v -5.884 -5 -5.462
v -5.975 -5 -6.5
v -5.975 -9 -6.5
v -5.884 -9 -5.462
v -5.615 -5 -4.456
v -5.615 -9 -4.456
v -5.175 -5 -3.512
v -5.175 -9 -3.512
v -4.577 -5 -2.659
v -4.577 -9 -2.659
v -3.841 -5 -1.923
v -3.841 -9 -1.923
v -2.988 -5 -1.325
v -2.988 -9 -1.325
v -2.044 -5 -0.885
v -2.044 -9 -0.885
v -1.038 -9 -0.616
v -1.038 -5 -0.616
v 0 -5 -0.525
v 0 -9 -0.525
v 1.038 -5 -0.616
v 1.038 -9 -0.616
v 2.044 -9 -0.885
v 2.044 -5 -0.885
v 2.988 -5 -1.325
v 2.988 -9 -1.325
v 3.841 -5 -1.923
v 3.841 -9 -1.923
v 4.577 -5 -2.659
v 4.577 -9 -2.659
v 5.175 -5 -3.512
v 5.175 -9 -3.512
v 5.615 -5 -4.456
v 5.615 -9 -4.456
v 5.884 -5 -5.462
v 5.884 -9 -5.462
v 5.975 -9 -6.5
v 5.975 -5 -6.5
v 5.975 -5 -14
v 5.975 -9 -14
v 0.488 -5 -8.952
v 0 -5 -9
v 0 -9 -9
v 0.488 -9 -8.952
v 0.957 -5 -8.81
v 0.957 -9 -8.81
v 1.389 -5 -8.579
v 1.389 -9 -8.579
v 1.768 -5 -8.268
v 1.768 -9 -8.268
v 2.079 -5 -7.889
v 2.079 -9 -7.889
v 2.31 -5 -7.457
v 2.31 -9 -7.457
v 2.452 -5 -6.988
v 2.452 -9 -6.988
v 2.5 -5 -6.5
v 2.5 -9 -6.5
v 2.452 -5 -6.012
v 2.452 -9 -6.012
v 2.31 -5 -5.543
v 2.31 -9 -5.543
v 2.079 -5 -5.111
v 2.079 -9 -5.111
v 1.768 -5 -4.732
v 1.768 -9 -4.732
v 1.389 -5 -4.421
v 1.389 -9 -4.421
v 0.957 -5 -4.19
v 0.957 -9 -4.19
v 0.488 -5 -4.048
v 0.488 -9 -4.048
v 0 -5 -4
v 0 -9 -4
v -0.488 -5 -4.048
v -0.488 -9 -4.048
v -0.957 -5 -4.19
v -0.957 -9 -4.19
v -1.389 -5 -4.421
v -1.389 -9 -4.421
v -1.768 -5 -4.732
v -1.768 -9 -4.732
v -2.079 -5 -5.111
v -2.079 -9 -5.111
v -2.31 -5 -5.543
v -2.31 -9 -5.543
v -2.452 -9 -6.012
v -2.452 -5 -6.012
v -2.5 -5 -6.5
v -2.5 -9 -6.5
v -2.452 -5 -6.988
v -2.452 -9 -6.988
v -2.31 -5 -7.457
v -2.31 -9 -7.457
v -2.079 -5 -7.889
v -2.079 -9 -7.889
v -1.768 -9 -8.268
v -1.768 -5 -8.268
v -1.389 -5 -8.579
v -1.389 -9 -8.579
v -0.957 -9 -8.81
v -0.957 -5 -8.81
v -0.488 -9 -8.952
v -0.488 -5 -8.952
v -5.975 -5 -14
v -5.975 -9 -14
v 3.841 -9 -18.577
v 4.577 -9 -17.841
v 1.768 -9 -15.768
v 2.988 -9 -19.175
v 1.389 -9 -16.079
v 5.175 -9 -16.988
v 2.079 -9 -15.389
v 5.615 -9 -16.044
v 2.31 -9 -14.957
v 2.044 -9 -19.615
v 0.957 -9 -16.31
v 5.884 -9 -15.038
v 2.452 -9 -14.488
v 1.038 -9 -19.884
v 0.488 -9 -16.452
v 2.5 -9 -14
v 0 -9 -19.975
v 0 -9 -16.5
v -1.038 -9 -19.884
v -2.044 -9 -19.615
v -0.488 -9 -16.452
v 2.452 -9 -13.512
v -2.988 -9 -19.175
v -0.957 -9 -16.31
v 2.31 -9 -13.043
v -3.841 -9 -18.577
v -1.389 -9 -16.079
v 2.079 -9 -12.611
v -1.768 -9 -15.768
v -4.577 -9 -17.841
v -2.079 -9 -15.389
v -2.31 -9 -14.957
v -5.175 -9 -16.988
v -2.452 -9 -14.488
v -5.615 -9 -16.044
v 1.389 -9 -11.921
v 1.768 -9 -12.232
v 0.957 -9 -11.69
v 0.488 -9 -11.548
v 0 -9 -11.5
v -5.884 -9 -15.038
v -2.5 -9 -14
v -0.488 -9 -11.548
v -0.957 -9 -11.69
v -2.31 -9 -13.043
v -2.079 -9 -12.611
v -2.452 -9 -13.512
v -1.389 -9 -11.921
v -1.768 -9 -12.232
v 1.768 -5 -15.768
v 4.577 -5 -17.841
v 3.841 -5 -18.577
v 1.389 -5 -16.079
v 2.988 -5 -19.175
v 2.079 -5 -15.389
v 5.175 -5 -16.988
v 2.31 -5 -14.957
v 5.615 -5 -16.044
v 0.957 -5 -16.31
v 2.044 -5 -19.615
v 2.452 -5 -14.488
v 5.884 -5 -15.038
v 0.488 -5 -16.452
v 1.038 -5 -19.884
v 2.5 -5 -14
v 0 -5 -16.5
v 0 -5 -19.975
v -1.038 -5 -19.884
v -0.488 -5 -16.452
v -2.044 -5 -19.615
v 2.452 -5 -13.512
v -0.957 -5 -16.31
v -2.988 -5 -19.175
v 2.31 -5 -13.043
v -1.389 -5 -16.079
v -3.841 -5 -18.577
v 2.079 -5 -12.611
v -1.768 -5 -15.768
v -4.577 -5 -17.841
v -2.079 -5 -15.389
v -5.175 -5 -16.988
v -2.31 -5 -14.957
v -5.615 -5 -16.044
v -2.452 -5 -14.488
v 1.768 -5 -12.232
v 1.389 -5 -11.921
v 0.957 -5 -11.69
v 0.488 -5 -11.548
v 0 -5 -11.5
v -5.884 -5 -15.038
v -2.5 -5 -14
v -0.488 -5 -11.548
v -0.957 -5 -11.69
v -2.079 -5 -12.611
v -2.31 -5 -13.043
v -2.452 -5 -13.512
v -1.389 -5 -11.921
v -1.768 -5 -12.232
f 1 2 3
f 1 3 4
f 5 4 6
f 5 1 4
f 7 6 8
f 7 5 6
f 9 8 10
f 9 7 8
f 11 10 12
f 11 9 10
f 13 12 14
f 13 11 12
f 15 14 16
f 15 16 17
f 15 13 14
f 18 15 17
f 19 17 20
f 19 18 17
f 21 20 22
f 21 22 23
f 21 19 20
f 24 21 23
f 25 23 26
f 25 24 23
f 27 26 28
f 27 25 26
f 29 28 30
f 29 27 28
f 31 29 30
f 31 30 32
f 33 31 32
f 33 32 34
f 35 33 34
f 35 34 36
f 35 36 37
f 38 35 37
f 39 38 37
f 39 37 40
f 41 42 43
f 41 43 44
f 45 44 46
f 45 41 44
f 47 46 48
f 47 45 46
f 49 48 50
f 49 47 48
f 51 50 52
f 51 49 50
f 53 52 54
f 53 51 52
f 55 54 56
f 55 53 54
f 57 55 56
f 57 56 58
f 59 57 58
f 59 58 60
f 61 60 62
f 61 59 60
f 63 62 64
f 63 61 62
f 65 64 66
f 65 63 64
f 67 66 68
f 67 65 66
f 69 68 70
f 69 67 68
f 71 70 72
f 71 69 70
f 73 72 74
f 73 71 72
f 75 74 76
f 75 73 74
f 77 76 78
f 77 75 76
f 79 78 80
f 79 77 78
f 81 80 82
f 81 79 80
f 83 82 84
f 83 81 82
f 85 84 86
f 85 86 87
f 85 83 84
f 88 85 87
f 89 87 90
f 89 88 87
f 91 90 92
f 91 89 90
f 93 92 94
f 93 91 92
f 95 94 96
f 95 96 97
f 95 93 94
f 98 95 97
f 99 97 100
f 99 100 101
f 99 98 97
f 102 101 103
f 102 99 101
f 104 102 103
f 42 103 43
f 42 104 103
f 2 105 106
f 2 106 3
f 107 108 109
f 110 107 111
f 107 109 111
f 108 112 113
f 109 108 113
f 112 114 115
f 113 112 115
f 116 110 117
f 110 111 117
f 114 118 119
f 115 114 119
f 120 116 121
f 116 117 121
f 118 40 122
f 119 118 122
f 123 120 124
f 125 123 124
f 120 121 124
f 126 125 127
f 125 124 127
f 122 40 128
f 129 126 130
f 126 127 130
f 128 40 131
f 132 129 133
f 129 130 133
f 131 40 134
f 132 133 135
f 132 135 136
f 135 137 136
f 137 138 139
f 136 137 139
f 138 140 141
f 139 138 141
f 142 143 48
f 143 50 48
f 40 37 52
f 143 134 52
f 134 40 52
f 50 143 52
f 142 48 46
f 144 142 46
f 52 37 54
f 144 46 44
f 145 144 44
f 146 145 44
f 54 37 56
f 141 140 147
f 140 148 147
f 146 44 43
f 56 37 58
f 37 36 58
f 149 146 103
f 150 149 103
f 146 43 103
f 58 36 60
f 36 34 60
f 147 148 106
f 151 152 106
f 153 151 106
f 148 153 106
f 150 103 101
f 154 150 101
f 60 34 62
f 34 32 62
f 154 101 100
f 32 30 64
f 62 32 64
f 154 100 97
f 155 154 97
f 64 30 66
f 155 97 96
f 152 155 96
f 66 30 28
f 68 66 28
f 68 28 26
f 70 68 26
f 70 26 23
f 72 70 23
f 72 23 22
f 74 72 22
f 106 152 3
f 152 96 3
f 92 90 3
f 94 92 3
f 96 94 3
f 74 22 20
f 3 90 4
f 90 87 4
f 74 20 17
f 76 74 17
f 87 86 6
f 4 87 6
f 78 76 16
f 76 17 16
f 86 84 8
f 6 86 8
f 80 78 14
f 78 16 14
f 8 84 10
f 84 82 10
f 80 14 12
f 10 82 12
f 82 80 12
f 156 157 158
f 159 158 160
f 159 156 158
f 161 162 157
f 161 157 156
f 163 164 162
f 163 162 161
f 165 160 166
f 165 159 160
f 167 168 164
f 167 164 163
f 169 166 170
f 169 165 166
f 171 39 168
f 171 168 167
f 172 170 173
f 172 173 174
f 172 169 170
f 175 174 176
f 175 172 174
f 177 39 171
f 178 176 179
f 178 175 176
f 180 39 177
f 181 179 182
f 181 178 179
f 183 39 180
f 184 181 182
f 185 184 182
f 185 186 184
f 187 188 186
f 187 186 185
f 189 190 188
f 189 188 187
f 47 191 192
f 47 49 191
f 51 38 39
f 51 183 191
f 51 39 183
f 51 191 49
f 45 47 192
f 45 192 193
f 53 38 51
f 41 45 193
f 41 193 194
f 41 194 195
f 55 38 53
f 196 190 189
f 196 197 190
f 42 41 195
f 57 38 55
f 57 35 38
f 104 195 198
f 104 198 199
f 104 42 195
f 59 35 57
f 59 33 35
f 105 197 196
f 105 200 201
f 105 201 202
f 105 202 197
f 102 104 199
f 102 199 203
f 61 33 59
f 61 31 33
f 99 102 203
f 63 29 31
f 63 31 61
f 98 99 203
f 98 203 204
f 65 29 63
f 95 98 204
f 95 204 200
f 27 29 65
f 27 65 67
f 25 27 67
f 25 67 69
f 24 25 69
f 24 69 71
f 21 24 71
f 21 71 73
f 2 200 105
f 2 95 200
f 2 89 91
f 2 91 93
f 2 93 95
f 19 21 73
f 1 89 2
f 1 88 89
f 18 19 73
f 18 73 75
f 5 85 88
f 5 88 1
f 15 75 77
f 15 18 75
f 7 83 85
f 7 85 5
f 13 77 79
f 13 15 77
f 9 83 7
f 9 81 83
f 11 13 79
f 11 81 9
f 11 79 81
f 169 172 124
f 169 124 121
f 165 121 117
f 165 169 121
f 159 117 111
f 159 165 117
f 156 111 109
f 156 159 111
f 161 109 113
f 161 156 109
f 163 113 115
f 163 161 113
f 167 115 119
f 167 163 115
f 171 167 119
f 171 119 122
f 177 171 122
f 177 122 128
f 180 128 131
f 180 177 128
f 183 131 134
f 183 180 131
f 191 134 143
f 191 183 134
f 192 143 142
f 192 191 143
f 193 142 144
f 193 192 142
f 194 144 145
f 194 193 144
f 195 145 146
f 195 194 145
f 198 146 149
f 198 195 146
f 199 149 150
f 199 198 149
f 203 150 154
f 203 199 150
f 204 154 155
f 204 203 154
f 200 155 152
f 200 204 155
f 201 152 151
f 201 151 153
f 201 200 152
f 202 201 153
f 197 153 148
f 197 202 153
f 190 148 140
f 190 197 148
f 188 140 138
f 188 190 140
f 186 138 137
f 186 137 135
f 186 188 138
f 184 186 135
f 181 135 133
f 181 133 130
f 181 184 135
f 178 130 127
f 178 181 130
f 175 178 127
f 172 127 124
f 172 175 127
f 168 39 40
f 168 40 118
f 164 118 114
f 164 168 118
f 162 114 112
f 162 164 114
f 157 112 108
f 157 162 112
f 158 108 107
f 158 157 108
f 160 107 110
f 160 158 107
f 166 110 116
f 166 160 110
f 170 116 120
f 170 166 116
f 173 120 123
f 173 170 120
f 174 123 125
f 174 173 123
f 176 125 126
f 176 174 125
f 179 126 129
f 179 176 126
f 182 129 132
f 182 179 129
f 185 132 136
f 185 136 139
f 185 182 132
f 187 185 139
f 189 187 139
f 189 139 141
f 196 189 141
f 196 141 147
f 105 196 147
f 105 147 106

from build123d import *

# Parameters (mm, degrees)
SKIZZE16_R                      = 2.5
AUFSATZ_LINEAR_AUSTRAGEN1_DEPTH = 4


with BuildPart() as part:
    # Skizze16 → Aufsatz-Linear austragen1 (new body)
    with BuildSketch(Plane.XZ.offset(5)):
        with BuildLine():
            Line((5.975062847, -6.5), (5.975062847, -14))
            ThreePointArc((5.975062847, -14), (0, -19.975062847), (-5.975062847, -14))
            Line((-5.975062847, -14), (-5.975062847, -6.5))
            ThreePointArc((-5.975062847, -6.5), (0, -0.524937153), (5.975062847, -6.5))
        make_face()
        with Locations(Location((0, -14, 0), (0, 0, 270))):
            Circle(SKIZZE16_R, mode=Mode.SUBTRACT)
        with Locations(Location((0, -6.5, 0), (0, 0, 270))):
            Circle(SKIZZE16_R, mode=Mode.SUBTRACT)
    extrude(amount=AUFSATZ_LINEAR_AUSTRAGEN1_DEPTH)


solid = part.part
